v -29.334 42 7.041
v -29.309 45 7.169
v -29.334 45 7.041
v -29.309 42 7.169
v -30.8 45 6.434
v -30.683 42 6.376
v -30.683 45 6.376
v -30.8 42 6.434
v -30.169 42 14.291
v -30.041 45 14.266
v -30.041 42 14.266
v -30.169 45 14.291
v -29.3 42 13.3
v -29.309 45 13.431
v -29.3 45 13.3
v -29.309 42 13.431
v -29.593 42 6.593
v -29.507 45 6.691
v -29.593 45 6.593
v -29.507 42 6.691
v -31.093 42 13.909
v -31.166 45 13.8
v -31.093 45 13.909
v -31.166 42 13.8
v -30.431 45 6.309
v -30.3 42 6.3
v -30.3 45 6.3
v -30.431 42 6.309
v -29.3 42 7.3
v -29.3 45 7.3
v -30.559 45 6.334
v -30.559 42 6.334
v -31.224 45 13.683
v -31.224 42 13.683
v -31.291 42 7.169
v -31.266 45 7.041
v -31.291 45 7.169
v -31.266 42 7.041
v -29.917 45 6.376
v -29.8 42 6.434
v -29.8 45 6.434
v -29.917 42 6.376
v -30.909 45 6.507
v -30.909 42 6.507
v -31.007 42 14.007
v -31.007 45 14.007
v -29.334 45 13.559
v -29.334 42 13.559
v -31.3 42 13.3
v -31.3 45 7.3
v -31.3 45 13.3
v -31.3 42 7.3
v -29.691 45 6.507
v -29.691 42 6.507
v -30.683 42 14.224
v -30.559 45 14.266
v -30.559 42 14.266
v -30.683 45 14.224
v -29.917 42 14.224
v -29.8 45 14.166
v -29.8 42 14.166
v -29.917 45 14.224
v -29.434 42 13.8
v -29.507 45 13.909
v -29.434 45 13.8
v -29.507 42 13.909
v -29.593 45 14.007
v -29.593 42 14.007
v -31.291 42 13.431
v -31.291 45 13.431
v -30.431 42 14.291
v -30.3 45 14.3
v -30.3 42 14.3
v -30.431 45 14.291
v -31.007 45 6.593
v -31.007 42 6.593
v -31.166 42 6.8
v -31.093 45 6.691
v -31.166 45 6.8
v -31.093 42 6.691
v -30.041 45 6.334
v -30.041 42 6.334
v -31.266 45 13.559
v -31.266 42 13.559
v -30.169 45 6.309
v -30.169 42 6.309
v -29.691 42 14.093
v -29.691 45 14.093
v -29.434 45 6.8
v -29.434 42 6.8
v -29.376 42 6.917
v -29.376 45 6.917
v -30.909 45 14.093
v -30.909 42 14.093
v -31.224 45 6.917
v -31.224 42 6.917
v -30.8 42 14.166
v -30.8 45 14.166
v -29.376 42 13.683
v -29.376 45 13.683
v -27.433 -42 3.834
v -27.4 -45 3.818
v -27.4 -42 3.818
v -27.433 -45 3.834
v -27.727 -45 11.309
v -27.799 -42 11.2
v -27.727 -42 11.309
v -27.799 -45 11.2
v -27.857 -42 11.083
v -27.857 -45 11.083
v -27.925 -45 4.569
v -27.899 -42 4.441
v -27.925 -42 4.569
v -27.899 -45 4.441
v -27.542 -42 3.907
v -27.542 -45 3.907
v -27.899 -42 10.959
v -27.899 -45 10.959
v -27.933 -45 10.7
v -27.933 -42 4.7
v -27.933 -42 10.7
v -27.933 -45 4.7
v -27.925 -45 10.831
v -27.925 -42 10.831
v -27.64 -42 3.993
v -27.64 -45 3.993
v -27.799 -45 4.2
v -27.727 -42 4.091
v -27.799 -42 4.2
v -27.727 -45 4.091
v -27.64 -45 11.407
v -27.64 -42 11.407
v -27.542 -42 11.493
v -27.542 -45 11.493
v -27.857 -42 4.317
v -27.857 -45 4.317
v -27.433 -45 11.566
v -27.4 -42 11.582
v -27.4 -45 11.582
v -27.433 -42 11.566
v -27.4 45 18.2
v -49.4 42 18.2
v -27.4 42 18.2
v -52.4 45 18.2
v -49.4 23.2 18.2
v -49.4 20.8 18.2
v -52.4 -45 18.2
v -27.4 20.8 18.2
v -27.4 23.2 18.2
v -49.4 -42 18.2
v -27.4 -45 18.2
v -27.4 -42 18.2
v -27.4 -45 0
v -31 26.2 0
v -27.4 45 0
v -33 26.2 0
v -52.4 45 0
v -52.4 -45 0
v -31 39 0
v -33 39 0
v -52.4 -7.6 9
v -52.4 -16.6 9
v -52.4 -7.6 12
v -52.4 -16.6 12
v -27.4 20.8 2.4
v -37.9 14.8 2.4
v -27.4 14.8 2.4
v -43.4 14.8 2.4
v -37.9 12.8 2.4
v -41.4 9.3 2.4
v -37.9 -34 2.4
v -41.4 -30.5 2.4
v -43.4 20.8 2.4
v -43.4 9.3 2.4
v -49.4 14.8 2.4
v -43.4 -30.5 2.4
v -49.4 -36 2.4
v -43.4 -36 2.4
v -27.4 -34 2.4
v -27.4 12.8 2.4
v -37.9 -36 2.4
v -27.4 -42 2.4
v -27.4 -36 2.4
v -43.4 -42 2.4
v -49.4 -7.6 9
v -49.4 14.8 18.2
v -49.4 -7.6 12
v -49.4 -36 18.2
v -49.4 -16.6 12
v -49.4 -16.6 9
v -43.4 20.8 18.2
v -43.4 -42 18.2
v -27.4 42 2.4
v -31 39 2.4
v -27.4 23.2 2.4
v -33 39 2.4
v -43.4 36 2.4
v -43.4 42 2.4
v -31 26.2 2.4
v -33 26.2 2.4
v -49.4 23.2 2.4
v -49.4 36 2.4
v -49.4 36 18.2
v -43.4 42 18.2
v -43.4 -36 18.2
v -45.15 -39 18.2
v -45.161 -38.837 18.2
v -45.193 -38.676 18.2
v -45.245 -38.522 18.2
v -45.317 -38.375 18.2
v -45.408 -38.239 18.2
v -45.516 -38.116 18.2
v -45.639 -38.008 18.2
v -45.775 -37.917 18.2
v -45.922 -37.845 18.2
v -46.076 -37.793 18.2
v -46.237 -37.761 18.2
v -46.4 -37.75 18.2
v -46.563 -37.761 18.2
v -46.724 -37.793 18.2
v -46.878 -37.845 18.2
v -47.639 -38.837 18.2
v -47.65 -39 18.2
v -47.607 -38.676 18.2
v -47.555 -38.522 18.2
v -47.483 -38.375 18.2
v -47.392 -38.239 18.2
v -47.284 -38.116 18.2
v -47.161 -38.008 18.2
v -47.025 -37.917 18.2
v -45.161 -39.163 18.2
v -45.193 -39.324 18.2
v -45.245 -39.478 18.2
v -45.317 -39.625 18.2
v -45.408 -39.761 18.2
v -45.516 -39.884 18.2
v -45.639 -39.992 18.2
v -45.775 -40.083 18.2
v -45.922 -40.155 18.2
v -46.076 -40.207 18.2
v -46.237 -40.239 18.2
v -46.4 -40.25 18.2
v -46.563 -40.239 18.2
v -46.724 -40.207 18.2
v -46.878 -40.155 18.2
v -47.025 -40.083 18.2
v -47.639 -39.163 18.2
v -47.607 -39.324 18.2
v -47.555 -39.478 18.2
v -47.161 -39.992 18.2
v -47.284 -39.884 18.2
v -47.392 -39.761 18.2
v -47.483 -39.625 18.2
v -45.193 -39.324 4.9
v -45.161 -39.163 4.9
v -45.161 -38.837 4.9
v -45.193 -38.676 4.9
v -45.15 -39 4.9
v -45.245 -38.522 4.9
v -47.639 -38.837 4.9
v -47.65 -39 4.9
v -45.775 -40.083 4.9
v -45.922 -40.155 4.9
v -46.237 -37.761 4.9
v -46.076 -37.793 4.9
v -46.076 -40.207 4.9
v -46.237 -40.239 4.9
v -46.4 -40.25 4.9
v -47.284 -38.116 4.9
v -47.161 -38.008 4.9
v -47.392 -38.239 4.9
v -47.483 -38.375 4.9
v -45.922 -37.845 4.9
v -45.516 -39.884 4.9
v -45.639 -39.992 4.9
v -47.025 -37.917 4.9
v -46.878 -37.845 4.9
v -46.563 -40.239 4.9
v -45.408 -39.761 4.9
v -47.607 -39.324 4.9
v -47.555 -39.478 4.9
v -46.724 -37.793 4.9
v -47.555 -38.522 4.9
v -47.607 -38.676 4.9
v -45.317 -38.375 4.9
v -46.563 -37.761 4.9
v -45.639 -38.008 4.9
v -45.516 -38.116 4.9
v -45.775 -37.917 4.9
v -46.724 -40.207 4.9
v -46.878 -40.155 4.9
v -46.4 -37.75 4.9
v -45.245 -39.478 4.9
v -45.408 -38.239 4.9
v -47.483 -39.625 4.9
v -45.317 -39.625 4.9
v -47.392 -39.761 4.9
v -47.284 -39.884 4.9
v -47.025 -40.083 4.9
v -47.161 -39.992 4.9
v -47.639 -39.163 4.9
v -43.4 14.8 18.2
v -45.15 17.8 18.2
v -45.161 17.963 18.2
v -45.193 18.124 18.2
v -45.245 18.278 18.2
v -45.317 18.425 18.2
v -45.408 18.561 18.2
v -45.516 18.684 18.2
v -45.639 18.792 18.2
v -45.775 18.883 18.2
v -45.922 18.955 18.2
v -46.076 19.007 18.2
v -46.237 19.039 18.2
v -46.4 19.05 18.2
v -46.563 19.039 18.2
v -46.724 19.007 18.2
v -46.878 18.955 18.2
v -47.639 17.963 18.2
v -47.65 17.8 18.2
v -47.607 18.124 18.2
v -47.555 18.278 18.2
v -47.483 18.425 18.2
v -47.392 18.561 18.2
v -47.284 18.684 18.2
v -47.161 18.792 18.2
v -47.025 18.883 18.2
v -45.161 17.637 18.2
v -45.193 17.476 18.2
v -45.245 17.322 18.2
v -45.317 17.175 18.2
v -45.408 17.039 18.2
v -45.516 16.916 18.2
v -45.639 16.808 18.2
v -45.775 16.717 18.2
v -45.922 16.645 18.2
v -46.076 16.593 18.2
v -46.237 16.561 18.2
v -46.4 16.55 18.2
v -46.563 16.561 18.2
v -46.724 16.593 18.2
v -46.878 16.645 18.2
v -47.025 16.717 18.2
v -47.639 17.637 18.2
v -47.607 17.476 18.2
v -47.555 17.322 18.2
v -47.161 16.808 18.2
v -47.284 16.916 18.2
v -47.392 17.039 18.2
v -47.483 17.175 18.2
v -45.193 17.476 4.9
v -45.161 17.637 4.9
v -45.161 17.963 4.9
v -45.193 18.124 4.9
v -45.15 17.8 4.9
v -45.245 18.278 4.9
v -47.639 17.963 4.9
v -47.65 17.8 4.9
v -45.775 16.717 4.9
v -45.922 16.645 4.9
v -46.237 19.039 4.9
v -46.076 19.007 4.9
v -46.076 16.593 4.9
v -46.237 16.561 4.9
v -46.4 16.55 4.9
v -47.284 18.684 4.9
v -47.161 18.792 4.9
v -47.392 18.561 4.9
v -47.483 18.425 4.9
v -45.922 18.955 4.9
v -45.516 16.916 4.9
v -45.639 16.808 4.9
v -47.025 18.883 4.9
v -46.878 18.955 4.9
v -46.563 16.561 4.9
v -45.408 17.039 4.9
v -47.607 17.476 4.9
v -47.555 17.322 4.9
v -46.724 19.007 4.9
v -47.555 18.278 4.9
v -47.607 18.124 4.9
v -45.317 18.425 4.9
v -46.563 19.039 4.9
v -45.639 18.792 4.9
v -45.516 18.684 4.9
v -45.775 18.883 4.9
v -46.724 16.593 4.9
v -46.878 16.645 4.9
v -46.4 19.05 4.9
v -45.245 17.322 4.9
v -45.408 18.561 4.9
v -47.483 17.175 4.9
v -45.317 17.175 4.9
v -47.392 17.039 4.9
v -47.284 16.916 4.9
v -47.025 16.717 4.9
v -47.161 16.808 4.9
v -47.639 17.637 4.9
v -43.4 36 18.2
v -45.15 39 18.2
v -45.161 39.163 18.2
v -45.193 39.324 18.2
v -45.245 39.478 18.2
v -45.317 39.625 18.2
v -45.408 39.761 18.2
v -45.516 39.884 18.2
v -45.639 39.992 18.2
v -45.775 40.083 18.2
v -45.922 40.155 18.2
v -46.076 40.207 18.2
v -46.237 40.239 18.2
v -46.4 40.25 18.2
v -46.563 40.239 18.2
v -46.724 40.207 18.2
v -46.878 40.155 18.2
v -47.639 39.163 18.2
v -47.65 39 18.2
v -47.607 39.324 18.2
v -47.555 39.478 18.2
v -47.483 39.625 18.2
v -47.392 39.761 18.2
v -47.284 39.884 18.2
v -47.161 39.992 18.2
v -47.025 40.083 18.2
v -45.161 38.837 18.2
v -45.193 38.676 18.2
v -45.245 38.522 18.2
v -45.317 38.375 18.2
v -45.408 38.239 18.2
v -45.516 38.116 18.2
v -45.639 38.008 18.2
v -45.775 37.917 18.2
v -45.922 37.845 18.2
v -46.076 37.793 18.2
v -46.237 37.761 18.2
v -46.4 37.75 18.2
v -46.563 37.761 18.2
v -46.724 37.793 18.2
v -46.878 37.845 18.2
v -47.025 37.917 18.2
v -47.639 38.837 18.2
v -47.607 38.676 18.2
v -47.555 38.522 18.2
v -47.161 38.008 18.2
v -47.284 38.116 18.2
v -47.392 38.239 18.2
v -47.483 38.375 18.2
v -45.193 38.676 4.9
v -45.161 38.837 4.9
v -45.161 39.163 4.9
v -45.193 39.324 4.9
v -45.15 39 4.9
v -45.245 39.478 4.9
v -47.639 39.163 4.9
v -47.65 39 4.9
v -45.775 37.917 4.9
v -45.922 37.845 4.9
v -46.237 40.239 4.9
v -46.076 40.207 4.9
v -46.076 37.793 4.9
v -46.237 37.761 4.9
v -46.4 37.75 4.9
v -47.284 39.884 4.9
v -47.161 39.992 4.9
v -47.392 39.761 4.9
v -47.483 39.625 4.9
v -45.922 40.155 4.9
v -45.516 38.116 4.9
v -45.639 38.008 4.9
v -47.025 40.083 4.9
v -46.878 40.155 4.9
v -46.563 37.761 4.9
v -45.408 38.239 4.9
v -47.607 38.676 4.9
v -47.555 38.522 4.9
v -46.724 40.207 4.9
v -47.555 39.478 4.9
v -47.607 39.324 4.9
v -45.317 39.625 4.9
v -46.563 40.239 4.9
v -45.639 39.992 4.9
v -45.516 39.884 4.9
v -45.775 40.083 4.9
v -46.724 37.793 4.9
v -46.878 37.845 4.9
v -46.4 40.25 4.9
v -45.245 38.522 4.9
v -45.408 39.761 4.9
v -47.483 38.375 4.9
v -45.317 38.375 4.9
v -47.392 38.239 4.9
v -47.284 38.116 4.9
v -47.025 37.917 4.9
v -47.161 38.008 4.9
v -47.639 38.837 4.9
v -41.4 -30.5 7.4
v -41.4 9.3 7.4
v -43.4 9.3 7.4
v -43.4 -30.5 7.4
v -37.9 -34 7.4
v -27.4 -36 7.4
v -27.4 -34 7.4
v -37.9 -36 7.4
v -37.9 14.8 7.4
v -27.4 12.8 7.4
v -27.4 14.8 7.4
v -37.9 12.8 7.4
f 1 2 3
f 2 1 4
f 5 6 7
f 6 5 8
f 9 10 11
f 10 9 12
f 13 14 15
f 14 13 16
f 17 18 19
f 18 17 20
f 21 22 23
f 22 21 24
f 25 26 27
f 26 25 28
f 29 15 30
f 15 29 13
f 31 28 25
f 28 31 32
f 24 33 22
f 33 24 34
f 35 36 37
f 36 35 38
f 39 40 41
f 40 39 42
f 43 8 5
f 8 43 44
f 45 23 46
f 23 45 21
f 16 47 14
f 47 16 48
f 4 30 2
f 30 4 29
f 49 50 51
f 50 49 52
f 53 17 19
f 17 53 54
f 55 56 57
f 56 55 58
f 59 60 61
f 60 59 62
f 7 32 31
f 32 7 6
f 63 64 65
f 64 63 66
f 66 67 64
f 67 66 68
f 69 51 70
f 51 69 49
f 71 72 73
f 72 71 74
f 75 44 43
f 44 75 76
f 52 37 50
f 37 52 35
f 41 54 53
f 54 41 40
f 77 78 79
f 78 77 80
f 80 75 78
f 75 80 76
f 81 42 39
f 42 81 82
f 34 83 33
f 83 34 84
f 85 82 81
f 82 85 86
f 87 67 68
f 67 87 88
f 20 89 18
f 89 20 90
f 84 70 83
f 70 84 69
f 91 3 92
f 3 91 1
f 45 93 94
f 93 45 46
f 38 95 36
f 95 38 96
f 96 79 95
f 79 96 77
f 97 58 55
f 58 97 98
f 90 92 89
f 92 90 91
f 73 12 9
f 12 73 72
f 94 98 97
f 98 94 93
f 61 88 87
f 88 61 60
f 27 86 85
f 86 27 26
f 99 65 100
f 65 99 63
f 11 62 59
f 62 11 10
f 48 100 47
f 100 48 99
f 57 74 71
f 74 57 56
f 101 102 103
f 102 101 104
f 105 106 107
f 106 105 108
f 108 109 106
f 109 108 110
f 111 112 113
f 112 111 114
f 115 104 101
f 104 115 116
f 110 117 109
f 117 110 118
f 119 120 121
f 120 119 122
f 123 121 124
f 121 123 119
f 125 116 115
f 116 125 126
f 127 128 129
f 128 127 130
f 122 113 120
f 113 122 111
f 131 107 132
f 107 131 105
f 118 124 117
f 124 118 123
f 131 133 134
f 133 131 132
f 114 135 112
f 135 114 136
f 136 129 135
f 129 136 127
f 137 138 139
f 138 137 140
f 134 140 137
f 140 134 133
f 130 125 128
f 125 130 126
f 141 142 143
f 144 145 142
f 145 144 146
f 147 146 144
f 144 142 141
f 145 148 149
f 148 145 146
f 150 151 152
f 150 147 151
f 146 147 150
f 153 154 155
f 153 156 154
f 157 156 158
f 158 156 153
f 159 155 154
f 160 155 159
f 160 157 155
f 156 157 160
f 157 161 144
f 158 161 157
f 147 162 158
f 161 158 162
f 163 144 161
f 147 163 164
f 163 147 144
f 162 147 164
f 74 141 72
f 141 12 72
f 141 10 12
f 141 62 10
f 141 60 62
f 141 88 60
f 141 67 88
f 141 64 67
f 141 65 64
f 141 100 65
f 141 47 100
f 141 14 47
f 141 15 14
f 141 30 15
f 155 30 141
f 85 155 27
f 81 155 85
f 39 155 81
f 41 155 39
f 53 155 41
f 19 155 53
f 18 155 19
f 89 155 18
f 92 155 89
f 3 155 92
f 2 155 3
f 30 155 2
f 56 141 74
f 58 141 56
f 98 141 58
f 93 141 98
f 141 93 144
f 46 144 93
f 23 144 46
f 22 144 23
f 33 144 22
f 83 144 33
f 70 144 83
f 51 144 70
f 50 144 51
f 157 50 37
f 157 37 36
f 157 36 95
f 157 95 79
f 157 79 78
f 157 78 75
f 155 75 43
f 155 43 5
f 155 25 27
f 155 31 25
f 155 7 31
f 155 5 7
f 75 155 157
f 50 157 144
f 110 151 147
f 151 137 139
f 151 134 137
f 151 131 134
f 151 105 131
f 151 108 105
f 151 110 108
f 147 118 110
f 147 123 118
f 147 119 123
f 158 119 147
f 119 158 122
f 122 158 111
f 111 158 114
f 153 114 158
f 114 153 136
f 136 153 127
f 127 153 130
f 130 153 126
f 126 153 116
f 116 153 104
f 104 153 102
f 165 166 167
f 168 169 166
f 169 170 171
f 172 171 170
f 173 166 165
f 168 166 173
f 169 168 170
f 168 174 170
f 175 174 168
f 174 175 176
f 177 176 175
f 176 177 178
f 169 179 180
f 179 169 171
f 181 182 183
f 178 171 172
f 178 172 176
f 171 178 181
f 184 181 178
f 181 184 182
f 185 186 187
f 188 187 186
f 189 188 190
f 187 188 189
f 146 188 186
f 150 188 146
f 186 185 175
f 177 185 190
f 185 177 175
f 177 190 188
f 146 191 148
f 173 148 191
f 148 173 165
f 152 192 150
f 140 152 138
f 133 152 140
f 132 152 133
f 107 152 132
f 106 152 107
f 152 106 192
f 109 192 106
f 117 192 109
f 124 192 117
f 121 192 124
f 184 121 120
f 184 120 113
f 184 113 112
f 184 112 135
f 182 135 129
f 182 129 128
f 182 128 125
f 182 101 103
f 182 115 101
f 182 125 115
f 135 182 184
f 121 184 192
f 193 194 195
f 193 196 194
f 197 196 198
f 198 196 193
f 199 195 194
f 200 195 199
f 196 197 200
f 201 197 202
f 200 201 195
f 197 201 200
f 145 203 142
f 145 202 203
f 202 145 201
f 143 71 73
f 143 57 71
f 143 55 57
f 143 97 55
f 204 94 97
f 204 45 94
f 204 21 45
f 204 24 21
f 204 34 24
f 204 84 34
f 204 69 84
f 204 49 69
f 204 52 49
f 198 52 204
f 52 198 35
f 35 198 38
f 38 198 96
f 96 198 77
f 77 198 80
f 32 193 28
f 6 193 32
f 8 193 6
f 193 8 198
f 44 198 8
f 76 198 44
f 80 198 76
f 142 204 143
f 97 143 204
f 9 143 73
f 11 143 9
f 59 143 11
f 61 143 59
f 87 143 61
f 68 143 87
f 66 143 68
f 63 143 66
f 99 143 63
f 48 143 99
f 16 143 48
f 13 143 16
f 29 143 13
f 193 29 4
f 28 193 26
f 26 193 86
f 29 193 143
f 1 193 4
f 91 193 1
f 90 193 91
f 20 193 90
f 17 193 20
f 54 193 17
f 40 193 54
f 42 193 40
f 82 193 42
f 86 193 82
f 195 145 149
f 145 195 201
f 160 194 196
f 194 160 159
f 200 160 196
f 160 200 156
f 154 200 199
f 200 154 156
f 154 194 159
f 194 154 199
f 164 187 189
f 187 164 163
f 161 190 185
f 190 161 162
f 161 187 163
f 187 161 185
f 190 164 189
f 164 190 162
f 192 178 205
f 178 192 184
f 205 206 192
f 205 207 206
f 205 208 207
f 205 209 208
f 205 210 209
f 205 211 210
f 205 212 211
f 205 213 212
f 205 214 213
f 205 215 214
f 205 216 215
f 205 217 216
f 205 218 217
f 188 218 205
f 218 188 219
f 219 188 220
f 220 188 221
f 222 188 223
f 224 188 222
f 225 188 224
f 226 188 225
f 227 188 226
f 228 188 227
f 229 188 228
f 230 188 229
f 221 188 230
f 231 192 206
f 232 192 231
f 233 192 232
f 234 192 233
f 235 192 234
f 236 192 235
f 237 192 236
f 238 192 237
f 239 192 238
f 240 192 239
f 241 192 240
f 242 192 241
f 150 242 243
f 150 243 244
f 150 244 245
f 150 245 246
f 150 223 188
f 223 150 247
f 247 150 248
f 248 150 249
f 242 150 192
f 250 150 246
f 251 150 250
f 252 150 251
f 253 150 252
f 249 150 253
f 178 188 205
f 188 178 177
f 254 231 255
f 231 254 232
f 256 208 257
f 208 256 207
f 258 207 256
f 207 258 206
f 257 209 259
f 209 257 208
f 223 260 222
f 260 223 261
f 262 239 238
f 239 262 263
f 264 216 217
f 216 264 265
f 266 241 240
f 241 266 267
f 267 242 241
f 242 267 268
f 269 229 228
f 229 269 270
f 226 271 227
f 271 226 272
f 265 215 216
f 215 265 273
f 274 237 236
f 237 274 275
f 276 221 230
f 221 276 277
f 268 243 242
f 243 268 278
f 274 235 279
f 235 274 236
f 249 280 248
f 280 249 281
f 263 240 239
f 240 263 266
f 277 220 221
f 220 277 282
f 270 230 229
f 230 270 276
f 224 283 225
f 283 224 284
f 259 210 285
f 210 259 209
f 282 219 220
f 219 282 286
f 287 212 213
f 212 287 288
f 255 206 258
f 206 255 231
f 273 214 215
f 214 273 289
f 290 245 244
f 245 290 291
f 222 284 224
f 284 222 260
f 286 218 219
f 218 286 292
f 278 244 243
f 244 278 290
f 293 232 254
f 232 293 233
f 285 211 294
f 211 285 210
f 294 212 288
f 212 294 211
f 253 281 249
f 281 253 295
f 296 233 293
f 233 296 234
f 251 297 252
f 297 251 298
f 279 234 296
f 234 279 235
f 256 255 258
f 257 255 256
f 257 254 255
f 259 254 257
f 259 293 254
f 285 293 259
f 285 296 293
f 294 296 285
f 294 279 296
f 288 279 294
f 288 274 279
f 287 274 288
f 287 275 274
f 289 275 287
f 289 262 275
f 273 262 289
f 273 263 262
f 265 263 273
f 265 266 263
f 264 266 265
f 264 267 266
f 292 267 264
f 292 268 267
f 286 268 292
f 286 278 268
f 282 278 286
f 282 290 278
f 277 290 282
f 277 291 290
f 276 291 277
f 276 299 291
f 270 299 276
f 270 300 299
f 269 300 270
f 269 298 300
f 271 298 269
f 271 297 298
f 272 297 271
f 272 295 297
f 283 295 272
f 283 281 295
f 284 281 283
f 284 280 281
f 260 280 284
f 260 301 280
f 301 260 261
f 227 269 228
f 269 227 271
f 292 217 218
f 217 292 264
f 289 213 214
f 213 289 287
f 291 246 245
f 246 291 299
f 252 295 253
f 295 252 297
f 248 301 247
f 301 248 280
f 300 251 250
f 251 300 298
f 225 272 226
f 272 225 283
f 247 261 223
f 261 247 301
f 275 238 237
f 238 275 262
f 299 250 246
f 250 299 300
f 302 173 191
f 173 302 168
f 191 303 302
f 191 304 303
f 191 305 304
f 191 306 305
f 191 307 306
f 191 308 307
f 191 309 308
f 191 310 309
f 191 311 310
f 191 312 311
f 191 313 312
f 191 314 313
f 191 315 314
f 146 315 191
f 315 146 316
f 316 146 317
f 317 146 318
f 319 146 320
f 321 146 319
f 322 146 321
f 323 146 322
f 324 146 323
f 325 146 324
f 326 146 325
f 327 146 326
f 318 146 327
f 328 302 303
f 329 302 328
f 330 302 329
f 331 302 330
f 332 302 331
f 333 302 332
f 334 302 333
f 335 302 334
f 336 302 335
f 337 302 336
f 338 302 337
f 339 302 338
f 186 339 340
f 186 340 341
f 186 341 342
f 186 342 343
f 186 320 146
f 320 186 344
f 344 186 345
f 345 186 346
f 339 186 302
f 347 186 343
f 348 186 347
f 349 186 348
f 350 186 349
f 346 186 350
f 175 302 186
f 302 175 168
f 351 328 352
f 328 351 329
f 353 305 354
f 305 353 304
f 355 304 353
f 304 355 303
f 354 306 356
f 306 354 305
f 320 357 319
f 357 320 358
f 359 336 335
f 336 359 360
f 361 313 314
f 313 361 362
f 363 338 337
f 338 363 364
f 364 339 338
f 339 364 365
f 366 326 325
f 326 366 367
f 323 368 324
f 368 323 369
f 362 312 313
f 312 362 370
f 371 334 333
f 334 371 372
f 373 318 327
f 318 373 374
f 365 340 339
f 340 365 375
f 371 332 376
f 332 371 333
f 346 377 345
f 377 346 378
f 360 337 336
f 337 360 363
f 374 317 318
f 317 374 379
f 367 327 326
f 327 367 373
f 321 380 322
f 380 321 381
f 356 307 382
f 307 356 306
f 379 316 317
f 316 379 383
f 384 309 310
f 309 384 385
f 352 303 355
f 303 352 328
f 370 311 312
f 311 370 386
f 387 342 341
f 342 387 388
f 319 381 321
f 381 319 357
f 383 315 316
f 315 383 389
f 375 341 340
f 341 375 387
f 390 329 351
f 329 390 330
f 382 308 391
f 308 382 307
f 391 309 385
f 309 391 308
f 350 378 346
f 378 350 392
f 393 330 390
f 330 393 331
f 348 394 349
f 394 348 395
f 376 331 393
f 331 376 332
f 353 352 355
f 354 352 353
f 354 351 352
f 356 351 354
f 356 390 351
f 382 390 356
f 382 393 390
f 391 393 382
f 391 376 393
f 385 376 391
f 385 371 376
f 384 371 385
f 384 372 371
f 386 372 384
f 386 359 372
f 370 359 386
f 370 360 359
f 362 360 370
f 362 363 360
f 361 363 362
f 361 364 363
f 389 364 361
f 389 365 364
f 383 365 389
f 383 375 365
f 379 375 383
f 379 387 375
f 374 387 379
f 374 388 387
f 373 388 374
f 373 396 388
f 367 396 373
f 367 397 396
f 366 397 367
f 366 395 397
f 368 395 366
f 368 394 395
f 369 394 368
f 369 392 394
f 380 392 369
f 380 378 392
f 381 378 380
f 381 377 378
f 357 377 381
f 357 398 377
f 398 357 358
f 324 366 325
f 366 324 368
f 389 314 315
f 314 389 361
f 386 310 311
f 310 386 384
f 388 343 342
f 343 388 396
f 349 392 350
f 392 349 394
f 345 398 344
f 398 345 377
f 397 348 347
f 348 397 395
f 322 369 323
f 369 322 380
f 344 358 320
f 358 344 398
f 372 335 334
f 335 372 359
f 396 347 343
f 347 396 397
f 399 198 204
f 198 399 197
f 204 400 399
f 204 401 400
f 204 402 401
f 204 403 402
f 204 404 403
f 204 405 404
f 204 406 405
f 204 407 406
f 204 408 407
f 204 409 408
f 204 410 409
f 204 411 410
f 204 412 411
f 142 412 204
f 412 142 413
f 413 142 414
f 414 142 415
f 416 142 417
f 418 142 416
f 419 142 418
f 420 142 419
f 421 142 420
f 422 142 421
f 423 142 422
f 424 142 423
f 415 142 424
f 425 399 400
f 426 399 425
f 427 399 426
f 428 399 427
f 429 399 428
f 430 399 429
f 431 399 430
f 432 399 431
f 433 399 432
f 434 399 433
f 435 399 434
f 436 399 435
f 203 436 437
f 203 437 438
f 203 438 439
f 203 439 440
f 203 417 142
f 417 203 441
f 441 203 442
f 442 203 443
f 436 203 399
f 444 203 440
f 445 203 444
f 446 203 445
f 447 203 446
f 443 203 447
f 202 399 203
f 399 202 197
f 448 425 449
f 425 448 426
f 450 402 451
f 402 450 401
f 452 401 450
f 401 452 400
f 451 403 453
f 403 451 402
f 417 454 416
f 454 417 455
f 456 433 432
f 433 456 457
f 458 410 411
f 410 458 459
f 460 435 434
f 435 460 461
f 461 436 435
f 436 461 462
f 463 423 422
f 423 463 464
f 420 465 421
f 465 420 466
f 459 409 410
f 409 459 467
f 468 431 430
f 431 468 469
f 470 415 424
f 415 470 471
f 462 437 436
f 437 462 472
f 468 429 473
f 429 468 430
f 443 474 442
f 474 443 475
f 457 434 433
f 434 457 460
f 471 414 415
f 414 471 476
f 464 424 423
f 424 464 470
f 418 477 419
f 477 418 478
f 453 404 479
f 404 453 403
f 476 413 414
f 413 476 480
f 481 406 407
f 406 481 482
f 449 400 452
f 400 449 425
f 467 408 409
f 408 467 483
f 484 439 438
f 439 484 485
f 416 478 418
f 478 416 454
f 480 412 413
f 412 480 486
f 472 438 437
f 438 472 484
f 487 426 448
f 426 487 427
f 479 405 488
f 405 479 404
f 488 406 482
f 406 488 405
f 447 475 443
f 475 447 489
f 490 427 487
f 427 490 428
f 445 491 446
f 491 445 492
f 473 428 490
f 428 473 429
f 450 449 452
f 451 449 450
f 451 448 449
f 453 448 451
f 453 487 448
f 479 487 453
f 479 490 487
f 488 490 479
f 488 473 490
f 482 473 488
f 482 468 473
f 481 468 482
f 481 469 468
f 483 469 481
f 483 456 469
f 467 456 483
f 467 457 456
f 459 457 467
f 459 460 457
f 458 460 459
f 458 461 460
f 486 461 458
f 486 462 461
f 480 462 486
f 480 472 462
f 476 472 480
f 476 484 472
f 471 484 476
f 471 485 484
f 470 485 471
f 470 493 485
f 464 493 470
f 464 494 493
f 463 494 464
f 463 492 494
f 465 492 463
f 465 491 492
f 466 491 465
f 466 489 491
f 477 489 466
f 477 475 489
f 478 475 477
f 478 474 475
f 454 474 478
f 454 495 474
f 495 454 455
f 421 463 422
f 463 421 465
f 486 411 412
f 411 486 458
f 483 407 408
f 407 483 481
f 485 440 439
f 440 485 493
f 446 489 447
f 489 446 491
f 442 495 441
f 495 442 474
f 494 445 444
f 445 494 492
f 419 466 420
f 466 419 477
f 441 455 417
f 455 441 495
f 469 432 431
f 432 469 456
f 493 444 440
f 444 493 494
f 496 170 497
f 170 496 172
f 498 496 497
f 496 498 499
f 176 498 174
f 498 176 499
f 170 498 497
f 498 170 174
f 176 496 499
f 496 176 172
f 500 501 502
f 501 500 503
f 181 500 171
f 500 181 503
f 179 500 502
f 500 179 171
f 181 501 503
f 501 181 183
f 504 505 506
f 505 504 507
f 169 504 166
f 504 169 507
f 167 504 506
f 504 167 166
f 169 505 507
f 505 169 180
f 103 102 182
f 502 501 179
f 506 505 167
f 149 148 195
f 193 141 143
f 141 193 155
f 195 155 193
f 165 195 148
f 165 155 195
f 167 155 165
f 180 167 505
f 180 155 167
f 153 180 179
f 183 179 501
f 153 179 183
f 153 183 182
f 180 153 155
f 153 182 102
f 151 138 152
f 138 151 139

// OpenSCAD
// file: params.scad
// Alle Masse des Projekts an einer Stelle.
//
// Die Werte stammen aus Messungen am echten Board, nicht mehr aus
// widerspruechlichen Netzangaben. Offen sind nur noch:
//   - Vorzeichen von usb_off (welche Kante im Modell unten liegt)
//   - insert_d / insert_h, solange keine Gewindeeinsaetze da sind
//
// Vor dem grossen Druck trotzdem case/fit_test.scad drucken (ca. 15 min).
// Erst wenn der passt, das Gehaeuse (ca. 5 h).

// ---- Leiterplatte ESP32-2432S028R ----
pcb_l          = 86.0;  // MESSEN: Laenge
pcb_w          = 50.0;  // MESSEN: Breite
pcb_t          =  1.6;  // MESSEN: Dicke
pcb_top_h      = 4.0;   // gemessen: Display, hoechstes Bauteil oben
pcb_bot_h      = 5.0;   // gemessen: Steckkontakt Lautsprecher, mit Toleranz

// ---- Sichtfenster des Displays ----
// 2,8" bei 320x240 (4:3) ergibt rechnerisch 56,9 x 42,7 mm aktive Flaeche.
win_l          = 68.0;      // gemessen
win_w          = 48.0;      // gemessen waren 50 = volle Platinenbreite. Hier 2 mm
                        // schmaler: bei buendigem Fenster sieht man bei jeder
                        // Montagetoleranz den Spalt zur Kavitaetswand.
win_off_l      = 0.0;      // Dein Wert 8,5 war der RAND je Seite, nicht der
                        // Versatz. 68 auf 86 mm ergibt 9 mm Rand beidseitig,
                        // also mittig: Versatz 0.
win_off_w      =  0.0;  // MESSEN: Versatz quer

// ---- Ausschnitte in den Seitenwaenden ----
usb_w          = 9.0;       // gemessen USB-C, Toleranz im Modell ueber gap
usb_h          = 3.0;       // gemessen
usb_off        = -1.5;     // aus 19/22 mm Randabstand: Mitte 23,5 statt 25.
                        // Vorzeichen pruefen -- +1,5, falls die 22er-Kante
                        // im Modell unten liegt (Seite mit dem SD-Schlitz).
sd_w           = 15.0;      // gemessen
sd_h           = 2.0;       // gemessen
sd_off         = -4.5;     // beginnt 31 mm von der USB-Stirnseite, Breite 15,
                        // Mitte also 38,5 von 86 -> 4,5 mm Richtung USB

// ---- Gehaeuse ----
wall           = 3.0;        // Wandstaerke, bewusst stabiler als noetig
gap            =  0.4;  // Spiel rund um die Platine
floor_t        =  2.4;
bezel_t        =  2.4;
pcb_rest       =  2.0;  // Breite der Auflageleisten unter der Platine
corner_col     =  6.0;  // Kantenlaenge der Eckpfeiler
// Verschraubung: mit Gewindeeinsaetzen oder direkt selbstschneidend.
// Einsaetze halten deutlich besser und vertragen mehrfaches Oeffnen;
// direkt ins Material geschraubt reicht fuer den Anfang.
use_inserts    = false;  // auf true, sobald Einsaetze da sind
screw_pilot_d  =  2.5;   // Kernloch fuer selbstschneidende M3 in PETG/ASA

insert_d       = 4.2;       // OFFEN: noch keine Gewindeeinsaetze vorhanden.
                        // Ohne sie halten die Schrauben nicht -- siehe
                        // case/README.md, Abschnitt Verschraubung.
insert_h       =  5.0;  // MESSEN: Laenge
screw_d        =  3.2;  // Durchgangsloch M3
screw_head_d   =  6.0;  // Senkung
press_pad      =  8.0;  // Kantenlaenge der Andrueckpads an den Platinenecken
vent_slot_w    =  2.0;
vent_slot_n    =  5;

// ---- Sensorkammer am Geraet (belueftet!) ----
// Diese Kammer ist BEWUSST offen zur Umgebungsluft. Ein dichtes Volumen
// wuerde als Hochpass wirken und genau die tiefen Frequenzen daempfen, um
// die es hier geht. Nicht verwechseln mit der Kalibrierkammer in
// sensor_chamber.scad -- die ist dicht, weil sie das genau soll.
// Sie liegt als abgetrennter Streifen OBEN in derselben Ebene wie die
// Elektronik, nicht als Beule auf der Rueckseite. Ein abstehender Pod
// verlagert das Gewicht nach hinten, laesst sich nicht ablegen und bricht
// als erstes ab.
sensor_pcb_l   = 19.0;    // gemessen: DFRobot-Platine
sensor_pcb_w   = 16.0;    // gemessen
                        // wuerde das Gehaeuse um rund 14 mm schrumpfen.
divider_t      =  2.4;  // Trennwand zwischen Kammer und Elektronik
foam_t         =  2.0;  // Moosgummi zur Entkopplung
cable_hole_d   =  6.0;  // Kabeldurchlass durch die Trennwand

// ---- Seitlicher Taster ----
// In der Stirnwand auf Hoehe der Sensorkammer: nach innen steht dort die
// Kammer zur Verfuegung. In der Elektronikkammer waere kein Platz fuer den
// Koerper des Tasters, dort sitzt die Platine.
btn_d          = 12.2;  // MESSEN: Bohrung fuer den Einbautaster
btn_at_right   = true;  // false setzt ihn auf die andere Stirnseite

// ---- Kabeldurchfuehrung ----
grommet_d      =  7.0;
strain_post_d  =  4.0;

// ---- Kalibrierkammer (separates Teil, DICHT) ----
cal_inner_d    = 40.0;
cal_inner_h    = 30.0;
cal_wall       =  2.4;
barb_od        =  6.0;  // passend zum Silikonschlauch 6 mm innen
barb_id        =  3.5;
barb_len       = 14.0;

// ---- Druckeinstellungen als Kommentar ----
// Material ASA oder PETG, kein PLA (im Fahrzeug bis 80 C).
// 0,2 mm Schicht, 4 Perimeter, 25 % Infill, keine Stuetzen noetig
// ausser am Barb der Kalibrierkammer.

// Ueberlappung fuer Koerper, die zusammengehoeren. Flaechenbuendig
// aneinanderstossende Volumen ergeben in CGAL eine nicht-mannigfaltige
// Geometrie, die kein Slicer sauber verarbeitet.
ovl = 0.5;

$fn = 48;

// ---- Abgeleitete Groessen, nicht von Hand aendern ----
cav_l  = pcb_l + 2*gap;
cav_w  = pcb_w + 2*gap;
col_span_l = cav_l + corner_col;          // Mittenabstand der Eckpfeiler
col_span_w = cav_w + corner_col;
out_l  = col_span_l + corner_col + 2*wall;
cav_h  = pcb_bot_h + pcb_t + pcb_top_h;

// Elektronikkammer unten, Sensorkammer als Streifen darueber.
elec_cav_w = cav_w + 2*corner_col;        // Innenmass quer
cham_cav_w = sensor_pcb_w + 2*gap + 2;    // Innenmass der Kammer quer
out_w  = wall + elec_cav_w + divider_t + cham_cav_w + wall;

// Mittellinien beider Kammern in Querrichtung
elec_cy = -out_w/2 + wall + elec_cav_w/2;
cham_cy =  out_w/2 - wall - cham_cav_w/2;

// Hoehe muss die Tasterbohrung aufnehmen, sonst bleibt rund um sie keine
// Wand stehen. Muss VOR press_h stehen: OpenSCAD loest Variablen in der
// Reihenfolge der Datei auf und meldet sonst nur eine Warnung, waehrend der
// Wert still undefiniert bleibt.
out_h  = max(floor_t + cav_h, btn_d + 2*wall);

// Die Pads reichen von der Blendenunterseite bis knapp auf die Platine.
// Sie haengen an out_h, nicht an der Platinenhoehe -- sonst erreichen sie die
// Platine nicht mehr, sobald das Gehaeuse wegen des Tasters hoeher wird.
press_h = out_h - (floor_t + pcb_bot_h + pcb_t) - 0.3;
// file: case.scad
// Gehaeuse des Bass-SPL-Meters: Rueckschale (Wanne) und Frontblende.
//
// Aufbau: ein flacher Kasten. Unten die Elektronik mit dem Display, oben ein
// durch eine Wand abgetrennter Streifen als Sensorkammer -- in derselben
// Ebene, nicht als Beule auf der Rueckseite. Ein abstehender Pod verlagert
// das Gewicht nach hinten, laesst sich nicht ablegen und bricht als erstes ab.
//
// Rendern:  make -C case
// part = "back" | "bezel" | "assembly"

include <params.scad>

part = "assembly";

// ---------------------------------------------------------------- Helfer

// Pfeiler mit Loch fuer den Gewindeeinsatz, an frei waehlbaren Stellen.
module post(x, y, h) {
    // Mit Gewindeeinsatz: kurzes, weites Loch zum Einschmelzen.
    // Ohne: schmales Kernloch ueber fast die ganze Hoehe, in das eine
    // selbstschneidende M3 ihr Gewinde zieht.
    hole_d = use_inserts ? insert_d : screw_pilot_d;
    hole_h = use_inserts ? insert_h + 1 : h - 2;
    translate([x, y, 0])
        difference() {
            translate([0, 0, h/2])
                cube([corner_col, corner_col, h], center = true);
            translate([0, 0, h - hole_h + 1])
                cylinder(d = hole_d, h = hole_h);
        }
}

// Die vier Pfeiler um die Platine herum dienen gleichzeitig als seitliche
// Anschlaege: ihre Innenflaechen liegen auf dem Platinenumriss plus Spiel.
module elec_posts(h) {
    for (sx = [-1, 1], sy = [-1, 1])
        post(sx * col_span_l/2, elec_cy + sy * col_span_w/2, h);
}

// Zwei zusaetzliche Pfeiler am oberen Rand, damit die Blende auch ueber der
// Sensorkammer aufliegt und nicht durchhaengt.
module cham_posts(h) {
    for (sx = [-1, 1])
        post(sx * col_span_l/2, out_w/2 - wall - corner_col/2, h);
}

module all_posts(h) { elec_posts(h); cham_posts(h); }

// Reihe von Lueftungsschlitzen entlang X
module vent_slots(len, n, slot_w, depth) {
    pitch = len / (n + 1);
    for (i = [1 : n])
        translate([-len/2 + i * pitch, 0, 0])
            rotate([90, 0, 0])
                translate([0, 0, -depth/2])
                    hull() {
                        translate([0, -3, 0]) cylinder(d = slot_w, h = depth);
                        translate([0,  3, 0]) cylinder(d = slot_w, h = depth);
                    }
}

// ------------------------------------------------------------ Rueckschale

module back_shell() {
    difference() {
        translate([0, 0, out_h/2])
            cube([out_l, out_w, out_h], center = true);

        // Elektronikkammer. Reicht bis zur Oberkante, nicht nur bis
        // Platinenhoehe: out_h richtet sich nach der Tasterbohrung und ist
        // groesser als der Platinenstapel. Sonst bliebe ein Deckel stehen.
        translate([0, elec_cy, floor_t + (out_h - floor_t)/2 + 1])
            cube([out_l - 2*wall, elec_cav_w, out_h - floor_t + 2],
                 center = true);

        // Sensorkammer. Geht bis ganz nach vorn: die Blende schliesst sie,
        // die Luft kommt ueber die Schlitze herein.
        translate([0, cham_cy, floor_t + (out_h - floor_t)/2 + 1])
            cube([out_l - 2*wall, cham_cav_w, out_h - floor_t + 2], center = true);

        // Kabeldurchlass durch die Trennwand
        translate([0, (elec_cy + cham_cy)/2, floor_t + cable_hole_d/2 + 1])
            rotate([90, 0, 0])
                cylinder(d = cable_hole_d, h = out_w, center = true);

        // Lueftung der Sensorkammer: Oberkante und Rueckwand, damit die Luft
        // quer durchziehen kann.
        translate([0, out_w/2, floor_t + (out_h - floor_t)/2])
            vent_slots(out_l - 4*corner_col, vent_slot_n + 2, vent_slot_w, wall*4);
        translate([0, cham_cy, -1])
            linear_extrude(floor_t + 2)
                for (i = [-2 : 2])
                    translate([i * 16, 0])
                        square([vent_slot_w, cham_cav_w - 6], center = true);

        // Seitlicher Taster, auf Hoehe der Sensorkammer
        translate([(btn_at_right ? 1 : -1) * out_l/2, cham_cy, out_h/2])
            rotate([0, 90, 0])
                cylinder(d = btn_d, h = wall*4, center = true);

        // USB-Buchse, Stirnseite
        translate([-out_l/2, elec_cy + usb_off,
                   floor_t + pcb_bot_h + pcb_t + usb_h/2])
            cube([wall*4, usb_w, usb_h], center = true);

        // microSD, untere Laengsseite
        translate([sd_off, -out_w/2, floor_t + pcb_bot_h + pcb_t/2])
            cube([sd_w, wall*4, sd_h + pcb_t], center = true);

        // Kabeldurchfuehrung der Versorgung
        translate([out_l/2, elec_cy, floor_t + cav_h/2])
            rotate([0, 90, 0])
                cylinder(d = grommet_d, h = wall*4, center = true);

        // Lueftung der Elektronikkammer gegen die Waerme des Wandlers
        translate([0, -out_w/2, floor_t + cav_h/2])
            vent_slots(out_l - 4*corner_col, vent_slot_n, vent_slot_w, wall*4);
    }

    translate([0, 0, floor_t - ovl]) all_posts(out_h - floor_t + ovl);

    // Auflageleisten fuer die Platine
    for (sx = [-1, 1])
        translate([sx * (cav_l/2 - pcb_rest/2), elec_cy,
                   floor_t + pcb_bot_h/2])
            cube([pcb_rest, cav_w - 2*corner_col + 2*ovl, pcb_bot_h],
                 center = true);
    for (sy = [-1, 1])
        translate([0, elec_cy + sy * (cav_w/2 - pcb_rest/2),
                   floor_t + pcb_bot_h/2])
            cube([cav_l - 2*corner_col + 2*ovl, pcb_rest, pcb_bot_h],
                 center = true);

    // Auflage fuer die Sensorplatine, darauf kommt das Moosgummi
    for (sx = [-1, 1])
        translate([sx * (sensor_pcb_l/2 - 1), cham_cy, floor_t + wall/2 - ovl])
            cube([2, sensor_pcb_w, wall + ovl], center = true);

    // Zugentlastung hinter der Kabeldurchfuehrung
    for (sy = [-1, 1])
        translate([col_span_l/2, elec_cy + sy * 6, floor_t - ovl])
            cylinder(d = strain_post_d, h = 6 + ovl);
}

// ------------------------------------------------------------ Frontblende

module bezel() {
    difference() {
        translate([0, 0, bezel_t/2])
            cube([out_l, out_w, bezel_t], center = true);

        // Sichtfenster, bezogen auf die Mitte der Elektronikkammer
        translate([win_off_l, elec_cy + win_off_w, -1])
            cube([win_l, win_w, bezel_t + 2], center = true);

        // Schraubenloecher mit Senkung, ueber allen sechs Pfeilern
        for (p = [[-1, elec_cy - col_span_w/2], [1, elec_cy - col_span_w/2],
                  [-1, elec_cy + col_span_w/2], [1, elec_cy + col_span_w/2],
                  [-1, out_w/2 - wall - corner_col/2],
                  [1, out_w/2 - wall - corner_col/2]])
            translate([p[0] * col_span_l/2, p[1], 0]) {
                translate([0, 0, -1]) cylinder(d = screw_d, h = bezel_t + 2);
                translate([0, 0, bezel_t - 1.6])
                    cylinder(d1 = screw_d, d2 = screw_head_d, h = 1.6 + 0.01);
            }
    }

    // Andruecker: vier Pads an den Platinenecken statt einer umlaufenden
    // Rippe. Wo auf dieser Platine Bauteile sitzen, ist unbekannt; die Ecken
    // sind bei praktisch jeder Platine frei.
    for (sx = [-1, 1], sy = [-1, 1])
        translate([sx * (cav_l/2 - press_pad/2),
                   elec_cy + sy * (cav_w/2 - press_pad/2),
                   -press_h/2])
            cube([press_pad, press_pad, press_h], center = true);
}

// ------------------------------------------------------------------ Bauen

if (part == "back")        back_shell();
else if (part == "bezel")  bezel();
else {
    back_shell();
    translate([0, 0, out_h + 14]) bezel();
}
// main file
// Passungslehre: ein 25 mm langes Stueck der echten Rueckschale.
//
// Druckt in etwa 15 Minuten und prueft genau die Masse, bei denen ein Fehler
// teuer waere:
//   - Spiel um die Platine (gap)
//   - Sitz der Gewindeeinsaetze (insert_d)
//   - Lage und Groesse des USB-Ausschnitts
//   - Wandstaerke und Auflagehoehe
//
// Erst wenn das Teil passt, lohnt der sechsstuendige Druck des Gehaeuses.
// Keine eigene Geometrie: schneidet direkt aus case.scad, kann also nicht
// auseinanderlaufen.

use <case.scad>
include <params.scad>

slab = 25;

intersection() {
    back_shell();
    translate([-out_l/2 + slab/2, 0, out_h/2])
        cube([slab, out_w + 2, out_h + 2], center = true);
}
